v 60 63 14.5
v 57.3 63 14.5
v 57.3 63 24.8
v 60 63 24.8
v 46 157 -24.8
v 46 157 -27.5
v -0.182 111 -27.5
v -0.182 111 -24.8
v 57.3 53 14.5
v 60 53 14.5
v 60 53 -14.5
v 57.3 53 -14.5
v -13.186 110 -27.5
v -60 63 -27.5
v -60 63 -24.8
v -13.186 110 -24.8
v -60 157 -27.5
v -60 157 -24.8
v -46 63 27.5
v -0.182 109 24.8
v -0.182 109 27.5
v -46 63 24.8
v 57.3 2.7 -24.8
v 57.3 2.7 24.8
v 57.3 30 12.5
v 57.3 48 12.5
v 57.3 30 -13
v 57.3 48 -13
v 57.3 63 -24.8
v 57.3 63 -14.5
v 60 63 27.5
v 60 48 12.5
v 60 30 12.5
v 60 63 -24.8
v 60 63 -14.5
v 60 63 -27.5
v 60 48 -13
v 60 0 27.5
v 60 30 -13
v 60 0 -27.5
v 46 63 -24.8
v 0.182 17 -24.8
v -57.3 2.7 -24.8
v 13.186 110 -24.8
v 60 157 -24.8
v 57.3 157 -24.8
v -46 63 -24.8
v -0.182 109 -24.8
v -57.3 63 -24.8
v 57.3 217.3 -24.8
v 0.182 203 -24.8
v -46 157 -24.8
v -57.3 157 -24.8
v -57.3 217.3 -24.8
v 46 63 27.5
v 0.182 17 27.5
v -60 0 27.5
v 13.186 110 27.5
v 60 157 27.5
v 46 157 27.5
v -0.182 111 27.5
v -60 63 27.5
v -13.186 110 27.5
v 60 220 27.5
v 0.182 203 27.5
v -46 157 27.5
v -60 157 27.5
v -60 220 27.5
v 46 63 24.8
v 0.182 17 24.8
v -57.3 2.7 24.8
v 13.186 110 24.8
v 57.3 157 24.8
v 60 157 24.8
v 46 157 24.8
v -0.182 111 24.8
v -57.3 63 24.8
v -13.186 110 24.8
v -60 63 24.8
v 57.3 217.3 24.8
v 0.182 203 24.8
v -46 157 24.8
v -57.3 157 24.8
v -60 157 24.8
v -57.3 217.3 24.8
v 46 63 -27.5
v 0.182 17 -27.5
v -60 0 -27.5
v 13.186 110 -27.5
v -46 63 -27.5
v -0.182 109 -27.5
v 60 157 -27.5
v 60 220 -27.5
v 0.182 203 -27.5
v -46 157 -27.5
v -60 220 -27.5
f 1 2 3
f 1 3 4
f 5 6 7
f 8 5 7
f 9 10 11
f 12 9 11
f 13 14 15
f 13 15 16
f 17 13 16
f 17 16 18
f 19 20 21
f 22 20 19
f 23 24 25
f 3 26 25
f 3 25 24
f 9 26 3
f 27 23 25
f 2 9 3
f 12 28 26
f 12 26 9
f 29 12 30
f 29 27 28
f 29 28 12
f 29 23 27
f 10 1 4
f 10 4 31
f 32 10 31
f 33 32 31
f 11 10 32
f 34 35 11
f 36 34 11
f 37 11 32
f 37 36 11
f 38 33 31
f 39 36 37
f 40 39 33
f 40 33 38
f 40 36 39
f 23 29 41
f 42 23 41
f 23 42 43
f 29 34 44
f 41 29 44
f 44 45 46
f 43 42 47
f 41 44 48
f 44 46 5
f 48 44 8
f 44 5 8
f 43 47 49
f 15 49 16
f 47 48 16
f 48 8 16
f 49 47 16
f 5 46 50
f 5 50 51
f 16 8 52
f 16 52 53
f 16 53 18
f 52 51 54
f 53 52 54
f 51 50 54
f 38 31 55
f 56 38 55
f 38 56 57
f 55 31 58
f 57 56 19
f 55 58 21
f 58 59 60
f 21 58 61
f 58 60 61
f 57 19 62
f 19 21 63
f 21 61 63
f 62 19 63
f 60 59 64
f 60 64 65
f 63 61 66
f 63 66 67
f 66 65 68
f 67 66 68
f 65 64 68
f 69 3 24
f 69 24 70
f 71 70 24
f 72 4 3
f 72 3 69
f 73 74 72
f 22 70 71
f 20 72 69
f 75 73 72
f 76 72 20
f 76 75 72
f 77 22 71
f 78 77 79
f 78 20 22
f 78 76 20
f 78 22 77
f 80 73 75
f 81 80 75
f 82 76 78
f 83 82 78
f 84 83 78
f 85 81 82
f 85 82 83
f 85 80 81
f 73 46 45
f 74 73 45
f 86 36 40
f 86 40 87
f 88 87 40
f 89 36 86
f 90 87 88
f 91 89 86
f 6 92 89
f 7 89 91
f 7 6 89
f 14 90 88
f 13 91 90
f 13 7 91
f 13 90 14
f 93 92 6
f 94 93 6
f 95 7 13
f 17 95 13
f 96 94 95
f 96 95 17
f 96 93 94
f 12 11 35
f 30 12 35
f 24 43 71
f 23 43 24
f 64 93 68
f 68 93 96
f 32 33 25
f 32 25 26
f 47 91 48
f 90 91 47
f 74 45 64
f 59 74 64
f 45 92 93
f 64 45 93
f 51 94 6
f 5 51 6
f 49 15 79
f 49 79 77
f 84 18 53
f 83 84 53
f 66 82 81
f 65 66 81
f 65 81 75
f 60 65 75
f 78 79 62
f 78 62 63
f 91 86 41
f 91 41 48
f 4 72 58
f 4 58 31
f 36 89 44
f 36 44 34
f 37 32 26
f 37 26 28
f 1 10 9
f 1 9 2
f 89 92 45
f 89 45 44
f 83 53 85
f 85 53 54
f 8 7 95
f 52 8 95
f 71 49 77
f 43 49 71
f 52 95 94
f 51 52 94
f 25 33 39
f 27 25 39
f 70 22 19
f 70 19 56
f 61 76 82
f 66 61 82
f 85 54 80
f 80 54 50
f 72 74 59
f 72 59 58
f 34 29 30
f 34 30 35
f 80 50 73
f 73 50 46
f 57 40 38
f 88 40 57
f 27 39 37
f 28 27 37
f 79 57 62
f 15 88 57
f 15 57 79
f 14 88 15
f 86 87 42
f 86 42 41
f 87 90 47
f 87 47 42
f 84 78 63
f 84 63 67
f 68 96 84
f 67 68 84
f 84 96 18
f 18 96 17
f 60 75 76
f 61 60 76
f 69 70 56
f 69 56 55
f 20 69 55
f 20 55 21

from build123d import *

# Parameters (mm, degrees)
EXTRUDE_1_DEPTH     = 55
EXTRUDE_2_DEPTH     = 55
EXTRUDE_3_DEPTH     = 2.7
EXTRUDE_START       = 52.3
EXTRUDE_4_DEPTH     = 2.7
SKETCH_4_W          = 25.5
SKETCH_4_H          = 18
SKETCH_4_W_2        = 29
SKETCH_4_H_2        = 10
CUT_EXTRUDE_1_DEPTH = 2.7


with BuildPart() as part:
    # 草图2 → 凸台-拉伸1 (new body)
    with BuildSketch(Plane.XY.offset(-27.5)):
        Polygon((57.3, 157), (60, 157), (60, 220), (-60, 220), (-60, 157), (-57.3, 157), (-57.3, 217.3), (57.3, 217.3), align=None)
    extrude(amount=EXTRUDE_1_DEPTH)



with BuildPart() as body_2:
    # 草图2<7> → 凸台-拉伸2 (new body)
    with BuildSketch(Plane.XY.offset(-27.5)):
        Polygon((-60, 0), (60, 0), (60, 63), (57.3, 63), (57.3, 2.7), (-57.3, 2.7), (-57.3, 63), (-60, 63), align=None)
    extrude(amount=EXTRUDE_2_DEPTH)


with BuildPart() as part_1:
    add(part.part)

    add(body_2.part)  # 凸台-拉伸3 merges body 2
    # 草图2<8> → 凸台-拉伸3 (add)
    with BuildSketch(Plane.XY.offset(-27.5)):
        Polygon((57.3, 63), (60, 63), (13.185508624, 110), (60, 157), (57.3, 157), (57.3, 217.3), (-57.3, 217.3), (-57.3, 157), (-60, 157), (-13.185508624, 110), (-60, 63), (-57.3, 63), (-57.3, 2.7), (57.3, 2.7), align=None)
        Polygon((46, 63), (0.18191994, 17.000359728), (-46, 63), (-0.18191994, 108.999640272), align=None, mode=Mode.SUBTRACT)
        Polygon((0.18191994, 202.999640272), (46, 157), (-0.18191994, 111.000359728), (-46, 157), align=None, mode=Mode.SUBTRACT)
    extrude(amount=EXTRUDE_3_DEPTH)

    # 草图2<9> → 凸台-拉伸4 (add)
    with BuildSketch(Plane.XY.offset(-27.5).offset(EXTRUDE_START)):
        Polygon((57.3, 63), (60, 63), (13.185508624, 110), (60, 157), (57.3, 157), (57.3, 217.3), (-57.3, 217.3), (-57.3, 157), (-60, 157), (-13.185508624, 110), (-60, 63), (-57.3, 63), (-57.3, 2.7), (57.3, 2.7), align=None)
        Polygon((46, 63), (0.18191994, 17.000359728), (-46, 63), (-0.18191994, 108.999640272), align=None, mode=Mode.SUBTRACT)
        Polygon((0.18191994, 202.999640272), (46, 157), (-0.18191994, 111.000359728), (-46, 157), align=None, mode=Mode.SUBTRACT)
    extrude(amount=EXTRUDE_4_DEPTH)

    # 草图4 → 切除-拉伸1 (cut)
    with BuildSketch(Plane(origin=(60, 0, 0), x_dir=(0, 0, -1), z_dir=(1, 0, 0))):
        with Locations((0.25, 39)):
            Rectangle(SKETCH_4_W, SKETCH_4_H)
        with Locations((0, 58)):
            Rectangle(SKETCH_4_W_2, SKETCH_4_H_2)
    extrude(amount=-CUT_EXTRUDE_1_DEPTH, mode=Mode.SUBTRACT)


solid = part_1.part
